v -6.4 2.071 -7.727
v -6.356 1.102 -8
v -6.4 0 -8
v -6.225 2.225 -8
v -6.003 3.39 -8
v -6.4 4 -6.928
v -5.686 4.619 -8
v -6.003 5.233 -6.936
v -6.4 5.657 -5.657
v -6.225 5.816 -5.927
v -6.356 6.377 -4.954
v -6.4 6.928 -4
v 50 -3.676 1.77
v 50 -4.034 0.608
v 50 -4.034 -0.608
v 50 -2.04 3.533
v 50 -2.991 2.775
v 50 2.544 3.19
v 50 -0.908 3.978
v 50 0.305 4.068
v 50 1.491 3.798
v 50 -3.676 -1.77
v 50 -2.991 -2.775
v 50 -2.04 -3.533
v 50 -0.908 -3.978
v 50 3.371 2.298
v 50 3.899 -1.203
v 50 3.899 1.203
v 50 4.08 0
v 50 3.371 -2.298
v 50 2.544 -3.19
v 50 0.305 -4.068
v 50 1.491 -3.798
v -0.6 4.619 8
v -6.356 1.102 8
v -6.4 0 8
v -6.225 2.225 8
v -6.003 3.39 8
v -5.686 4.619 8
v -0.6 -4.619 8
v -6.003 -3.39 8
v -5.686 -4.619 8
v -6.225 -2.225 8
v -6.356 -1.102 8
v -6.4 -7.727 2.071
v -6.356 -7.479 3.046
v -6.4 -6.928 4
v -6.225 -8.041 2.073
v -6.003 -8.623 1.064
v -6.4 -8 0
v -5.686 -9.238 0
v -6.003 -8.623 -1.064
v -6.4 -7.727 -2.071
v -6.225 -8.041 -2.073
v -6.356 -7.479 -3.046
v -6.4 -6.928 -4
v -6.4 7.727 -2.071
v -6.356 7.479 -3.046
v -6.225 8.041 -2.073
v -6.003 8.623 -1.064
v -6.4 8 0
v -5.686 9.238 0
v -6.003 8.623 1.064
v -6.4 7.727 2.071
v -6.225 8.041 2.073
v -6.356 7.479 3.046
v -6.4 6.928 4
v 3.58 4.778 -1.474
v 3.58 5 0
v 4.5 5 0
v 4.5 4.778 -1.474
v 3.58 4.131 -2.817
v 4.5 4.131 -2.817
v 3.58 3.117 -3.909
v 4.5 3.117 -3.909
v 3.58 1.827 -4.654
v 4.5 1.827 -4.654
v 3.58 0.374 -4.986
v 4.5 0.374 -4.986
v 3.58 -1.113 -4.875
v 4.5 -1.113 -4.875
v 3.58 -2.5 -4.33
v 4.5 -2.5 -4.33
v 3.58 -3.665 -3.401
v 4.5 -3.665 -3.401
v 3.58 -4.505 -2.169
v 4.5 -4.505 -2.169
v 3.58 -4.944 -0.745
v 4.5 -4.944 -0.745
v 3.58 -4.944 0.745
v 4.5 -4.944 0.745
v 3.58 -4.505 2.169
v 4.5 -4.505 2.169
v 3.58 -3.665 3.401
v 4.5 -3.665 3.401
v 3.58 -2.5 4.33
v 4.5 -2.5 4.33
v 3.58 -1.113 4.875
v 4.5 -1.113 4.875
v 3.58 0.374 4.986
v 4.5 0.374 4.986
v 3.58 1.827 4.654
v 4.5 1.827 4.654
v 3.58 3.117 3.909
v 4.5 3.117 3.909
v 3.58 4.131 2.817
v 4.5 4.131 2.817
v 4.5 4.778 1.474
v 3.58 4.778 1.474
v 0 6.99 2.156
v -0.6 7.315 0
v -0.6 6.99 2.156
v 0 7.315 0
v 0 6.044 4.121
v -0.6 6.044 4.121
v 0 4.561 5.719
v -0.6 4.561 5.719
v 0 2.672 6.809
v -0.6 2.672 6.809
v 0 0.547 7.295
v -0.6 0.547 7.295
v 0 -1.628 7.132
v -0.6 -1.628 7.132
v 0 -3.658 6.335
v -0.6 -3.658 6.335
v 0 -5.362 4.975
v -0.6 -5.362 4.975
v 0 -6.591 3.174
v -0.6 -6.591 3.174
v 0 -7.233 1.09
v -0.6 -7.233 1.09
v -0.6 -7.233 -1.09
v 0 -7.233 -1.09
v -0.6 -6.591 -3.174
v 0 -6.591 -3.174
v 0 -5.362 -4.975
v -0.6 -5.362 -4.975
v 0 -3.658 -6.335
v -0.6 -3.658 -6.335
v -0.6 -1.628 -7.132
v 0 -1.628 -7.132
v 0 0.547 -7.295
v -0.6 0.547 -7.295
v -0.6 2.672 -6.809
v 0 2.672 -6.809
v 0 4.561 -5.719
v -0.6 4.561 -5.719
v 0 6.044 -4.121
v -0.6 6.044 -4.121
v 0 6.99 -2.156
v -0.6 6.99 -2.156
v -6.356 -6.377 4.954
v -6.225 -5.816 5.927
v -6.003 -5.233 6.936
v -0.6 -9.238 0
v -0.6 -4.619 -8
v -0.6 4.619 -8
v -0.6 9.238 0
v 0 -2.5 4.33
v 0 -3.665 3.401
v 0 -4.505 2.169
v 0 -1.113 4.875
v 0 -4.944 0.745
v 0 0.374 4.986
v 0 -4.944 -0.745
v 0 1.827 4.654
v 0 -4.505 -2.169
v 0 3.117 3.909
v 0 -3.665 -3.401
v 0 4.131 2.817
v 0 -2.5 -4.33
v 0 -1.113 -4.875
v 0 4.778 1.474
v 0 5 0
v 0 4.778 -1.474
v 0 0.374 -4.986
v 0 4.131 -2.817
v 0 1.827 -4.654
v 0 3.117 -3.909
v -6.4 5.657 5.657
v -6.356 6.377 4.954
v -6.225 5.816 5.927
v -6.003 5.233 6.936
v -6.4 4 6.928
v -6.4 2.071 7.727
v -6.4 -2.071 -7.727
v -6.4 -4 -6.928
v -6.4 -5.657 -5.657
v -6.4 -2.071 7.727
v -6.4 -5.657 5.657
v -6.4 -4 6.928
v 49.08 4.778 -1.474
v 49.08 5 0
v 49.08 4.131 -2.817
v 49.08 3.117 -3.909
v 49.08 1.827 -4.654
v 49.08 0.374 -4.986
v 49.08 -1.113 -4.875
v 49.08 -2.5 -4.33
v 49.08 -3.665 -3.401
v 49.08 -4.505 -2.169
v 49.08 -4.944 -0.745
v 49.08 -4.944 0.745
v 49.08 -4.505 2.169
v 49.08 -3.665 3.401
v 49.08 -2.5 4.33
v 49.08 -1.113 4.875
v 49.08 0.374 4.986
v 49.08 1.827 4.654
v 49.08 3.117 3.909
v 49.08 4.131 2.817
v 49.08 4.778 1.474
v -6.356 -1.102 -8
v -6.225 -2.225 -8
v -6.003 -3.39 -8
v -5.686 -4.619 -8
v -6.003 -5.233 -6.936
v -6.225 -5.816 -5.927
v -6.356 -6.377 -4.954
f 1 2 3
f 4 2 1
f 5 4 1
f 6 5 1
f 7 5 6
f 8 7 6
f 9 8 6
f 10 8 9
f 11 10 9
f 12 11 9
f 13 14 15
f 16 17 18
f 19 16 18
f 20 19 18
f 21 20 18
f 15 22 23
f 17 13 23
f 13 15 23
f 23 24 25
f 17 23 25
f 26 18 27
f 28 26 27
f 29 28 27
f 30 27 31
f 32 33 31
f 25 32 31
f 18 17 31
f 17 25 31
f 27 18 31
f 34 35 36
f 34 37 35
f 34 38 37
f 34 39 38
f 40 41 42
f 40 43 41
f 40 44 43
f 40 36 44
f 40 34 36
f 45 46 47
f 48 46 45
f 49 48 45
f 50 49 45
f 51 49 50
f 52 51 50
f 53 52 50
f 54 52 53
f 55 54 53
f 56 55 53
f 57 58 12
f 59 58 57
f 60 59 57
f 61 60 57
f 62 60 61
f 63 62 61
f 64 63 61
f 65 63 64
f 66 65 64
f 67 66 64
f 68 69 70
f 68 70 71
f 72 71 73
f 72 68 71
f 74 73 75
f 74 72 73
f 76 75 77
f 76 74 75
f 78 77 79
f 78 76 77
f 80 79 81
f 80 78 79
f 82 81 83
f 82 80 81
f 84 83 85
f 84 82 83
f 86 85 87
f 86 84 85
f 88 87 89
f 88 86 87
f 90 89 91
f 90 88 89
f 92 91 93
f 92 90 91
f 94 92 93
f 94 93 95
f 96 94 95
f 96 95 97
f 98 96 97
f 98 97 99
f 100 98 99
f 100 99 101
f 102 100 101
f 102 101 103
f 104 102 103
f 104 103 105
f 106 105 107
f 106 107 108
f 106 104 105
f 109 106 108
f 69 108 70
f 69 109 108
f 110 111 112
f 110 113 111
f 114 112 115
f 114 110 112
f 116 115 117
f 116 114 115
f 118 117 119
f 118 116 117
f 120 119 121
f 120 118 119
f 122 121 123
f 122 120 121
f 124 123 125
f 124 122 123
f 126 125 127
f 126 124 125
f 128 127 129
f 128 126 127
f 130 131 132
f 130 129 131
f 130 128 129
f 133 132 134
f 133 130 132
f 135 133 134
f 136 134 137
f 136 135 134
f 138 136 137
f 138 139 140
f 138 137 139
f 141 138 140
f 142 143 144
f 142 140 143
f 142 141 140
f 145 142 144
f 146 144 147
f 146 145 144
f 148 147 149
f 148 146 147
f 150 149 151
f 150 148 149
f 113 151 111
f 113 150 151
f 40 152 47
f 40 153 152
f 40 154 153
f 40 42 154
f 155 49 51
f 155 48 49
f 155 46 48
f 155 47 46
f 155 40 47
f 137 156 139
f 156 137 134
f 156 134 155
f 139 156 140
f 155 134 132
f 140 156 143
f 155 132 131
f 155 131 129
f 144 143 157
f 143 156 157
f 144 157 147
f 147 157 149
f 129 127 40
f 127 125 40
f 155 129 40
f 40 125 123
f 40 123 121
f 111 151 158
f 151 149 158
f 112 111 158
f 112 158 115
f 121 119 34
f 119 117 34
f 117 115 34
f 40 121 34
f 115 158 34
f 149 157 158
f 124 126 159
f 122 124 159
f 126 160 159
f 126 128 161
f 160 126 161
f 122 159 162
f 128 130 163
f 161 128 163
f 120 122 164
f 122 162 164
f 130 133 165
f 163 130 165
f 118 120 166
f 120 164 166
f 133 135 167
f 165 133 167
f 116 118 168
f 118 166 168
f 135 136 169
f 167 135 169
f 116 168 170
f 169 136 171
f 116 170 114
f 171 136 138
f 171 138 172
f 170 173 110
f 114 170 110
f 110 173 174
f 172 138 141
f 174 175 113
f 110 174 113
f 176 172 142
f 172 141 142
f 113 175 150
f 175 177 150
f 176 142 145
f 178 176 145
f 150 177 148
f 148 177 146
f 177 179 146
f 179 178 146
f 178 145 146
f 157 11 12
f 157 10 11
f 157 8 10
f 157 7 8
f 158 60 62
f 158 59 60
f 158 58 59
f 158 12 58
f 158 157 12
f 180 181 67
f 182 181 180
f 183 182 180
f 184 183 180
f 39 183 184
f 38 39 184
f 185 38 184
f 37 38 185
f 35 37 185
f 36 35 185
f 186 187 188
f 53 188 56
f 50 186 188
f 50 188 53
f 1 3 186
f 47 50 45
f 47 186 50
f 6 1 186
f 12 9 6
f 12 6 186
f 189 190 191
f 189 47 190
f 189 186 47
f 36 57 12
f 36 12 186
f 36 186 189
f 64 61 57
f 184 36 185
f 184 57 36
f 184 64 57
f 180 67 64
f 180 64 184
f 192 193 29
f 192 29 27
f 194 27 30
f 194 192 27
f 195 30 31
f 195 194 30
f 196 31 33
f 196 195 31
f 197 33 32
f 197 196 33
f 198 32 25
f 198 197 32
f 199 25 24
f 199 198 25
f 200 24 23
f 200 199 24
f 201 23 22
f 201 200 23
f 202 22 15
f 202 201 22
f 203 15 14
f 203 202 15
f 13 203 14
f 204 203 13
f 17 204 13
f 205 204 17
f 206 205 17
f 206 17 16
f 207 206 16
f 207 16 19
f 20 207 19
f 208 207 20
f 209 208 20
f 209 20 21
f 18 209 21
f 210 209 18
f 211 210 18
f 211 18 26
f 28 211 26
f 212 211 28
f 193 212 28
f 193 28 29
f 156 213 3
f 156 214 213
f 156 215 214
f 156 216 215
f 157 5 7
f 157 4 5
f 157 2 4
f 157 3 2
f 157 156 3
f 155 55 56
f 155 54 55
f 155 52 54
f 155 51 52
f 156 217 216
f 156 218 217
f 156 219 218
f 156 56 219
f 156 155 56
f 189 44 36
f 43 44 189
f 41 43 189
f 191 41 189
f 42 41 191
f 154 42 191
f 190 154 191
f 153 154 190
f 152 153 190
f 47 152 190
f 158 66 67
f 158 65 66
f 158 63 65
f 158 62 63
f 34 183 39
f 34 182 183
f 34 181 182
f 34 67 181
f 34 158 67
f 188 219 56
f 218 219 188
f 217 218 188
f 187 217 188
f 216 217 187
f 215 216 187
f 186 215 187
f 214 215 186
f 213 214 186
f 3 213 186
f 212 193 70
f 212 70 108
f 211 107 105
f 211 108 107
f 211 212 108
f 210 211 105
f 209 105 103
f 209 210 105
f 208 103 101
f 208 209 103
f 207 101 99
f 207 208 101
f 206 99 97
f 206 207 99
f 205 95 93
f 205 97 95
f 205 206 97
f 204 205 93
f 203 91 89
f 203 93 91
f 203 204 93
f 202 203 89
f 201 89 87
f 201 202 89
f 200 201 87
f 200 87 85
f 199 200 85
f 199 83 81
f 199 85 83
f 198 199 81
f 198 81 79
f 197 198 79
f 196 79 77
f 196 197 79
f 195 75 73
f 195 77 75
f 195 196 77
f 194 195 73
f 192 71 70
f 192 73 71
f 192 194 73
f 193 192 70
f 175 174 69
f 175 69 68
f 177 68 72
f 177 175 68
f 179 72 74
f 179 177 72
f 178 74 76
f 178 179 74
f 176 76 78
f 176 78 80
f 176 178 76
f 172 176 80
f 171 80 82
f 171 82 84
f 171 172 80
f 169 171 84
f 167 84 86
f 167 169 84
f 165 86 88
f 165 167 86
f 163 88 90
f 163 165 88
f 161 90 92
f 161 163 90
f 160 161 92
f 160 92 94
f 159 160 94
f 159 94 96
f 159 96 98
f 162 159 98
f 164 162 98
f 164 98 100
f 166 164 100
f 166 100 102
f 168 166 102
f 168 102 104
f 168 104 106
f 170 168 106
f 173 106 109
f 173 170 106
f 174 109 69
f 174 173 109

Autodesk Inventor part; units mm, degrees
ref_plane "YZ Plane" through (0, 0, 0) normal (1, 0, 0) x (0, 1, 0)
ref_plane "XZ Plane" through (0, 0, 0) normal (0, 1, 0) x (-1, 0, 0)
sketch "Sketch1" plane through (0, 0, 0) normal (0, 0, 1) x (1, 0, 0)
  line L0 (0, 7.315) -> (0, 5)
  line L1 (4.5, 5) -> (50, 5)
  line L2 (50, 5) -> (50, 0)
  line L3 (50, 0) -> (-0.6001, 0)
  line L4 (-10.7201, 0) -> (60.12, 0) projected
  line L5 (-0.6001, 0) -> (-0.6001, 7.315)
  line L6 (-0.6001, 7.315) -> (0, 7.315)
  line L7 (4.5, 5) -> (3.5797, 5)
  line L8 (3.5797, 5) -> (0, 5)
  line L9 (0, -1.463) -> (0, 8.778) projected
  dimension "d0" = 50
  dimension "d1" = 45.5
  dimension "d2" = 10
  dimension "d9" = 0.6001
  dimension "d10" = 14.63
  dimension "d13" = 0.9203
  dimension "d14" = 10
revolve "Body" add sketch "Sketch1" angle 360 about axis through (50, 0, 0) along (-1, 0, 0)
sketch "Sketch2" plane through (-0.6001, 0, 0) normal (-1, 0, 0) x (0, 0, 1)
  line L0 (0, 9.2376) -> (8, 4.6188)
  line L1 (8, 4.6188) -> (8, -4.6188)
  line L2 (8, -4.6188) -> (0, -9.2376)
  line L3 (0, -9.2376) -> (-8, -4.6188)
  line L4 (-8, -4.6188) -> (-8, 4.6188)
  line L5 (-8, 4.6188) -> (0, 9.2376)
  point P0 (0, 0)
  point P1 (0, 0)
  dimension "d11" = 16
extrude "Head" add sketch "Sketch2" along normal blind 5.8
sketch "Sketch4" plane through (0, 0, 0) normal (0, 0, 1) x (1, 0, 0)
  line L0 (-6.4001, 8) -> (-6.4001, 9.2376)
  line L1 (-6.4001, 9.2376) -> (-5.6856, 9.2376)
  line L2 (-5.6856, 9.2376) -> (-6.4001, 8)
  line L3 (-7.5601, 0) -> (0.5599, 0) projected
  line L4 (-0.6001, 9.2376) -> (-6.4001, 9.2376) projected
  line L5 (-6.4001, 4.6188) -> (-6.4001, 9.2376) projected
  dimension "d5" = 30
  dimension "d19" = 16
revolve "Chamfer1" cut sketch "Sketch4" angle 360 about axis through (-10, 0, 0) along (1, 0, 0)
thread "Thread" size "M10x1.5" class "6g" standard "ISO Metric profile" length 45.5
chamfer "Chamfer2" distance 0.9202 distance2 0.9203 1 edges at (50, -5, 0) measured on face at (50, -1.8775, 0.7745)
ref_plane "Work Plane1" through (1.525, 0, 0) normal (0, 0, 1) x (1, 0, 0)
equation "\"d0\" = NLG"
equation "\"d1\" = GEL"
equation "\"d2\" = GD"
equation "\"d10\" = SD2"
equation "\"d14\" = BDM"
equation "\"d11\" = SW"
equation "\"d3\" = KOH - SD"
equation "\"d5\" = ANG1"
equation "\"d19\" = SW0"
equation "\"d15\" = GEL"
equation "\"d6\" = -0.5 * SPD + 0.5 * GD"
equation "\"NLG\" = 50"
equation "\"GD\" = NND"
equation "\"BDM\" = NND"
equation "\"KOH\" = 6.4"
equation "\"GEL\" = 45.5"
equation "\"SW\" = 16"
equation "\"SW0\" = SW"
equation "\"SPD\" = NND - 1.2269 * PTC"
equation "\"SD2\" = 14.63"
equation "\"SD\" = 0.6"
equation "\"ANG1\" = 30deg"
equation "\"GAL\" = 0.61345 * PTC"
equation "\"GUL\" = 0.61345 * PTC"
equation "\"RR\" = 0.4"
equation "\"GD1\" = THREADDIA - 1.2269 * PTC"
equation "\"SDH\" = SD2"
equation "\"SDHG\" = 4.5"
equation "\"TOA\" = 30deg"
equation "\"PTC\" = 1.5"
equation "\"E0\" = 18.48"
equation "\"NND\" = 10"
equation "\"THREADDIA\" = 10"
properties part number "ISO 4017 - M10 x 50" material "Steel, Mild"
